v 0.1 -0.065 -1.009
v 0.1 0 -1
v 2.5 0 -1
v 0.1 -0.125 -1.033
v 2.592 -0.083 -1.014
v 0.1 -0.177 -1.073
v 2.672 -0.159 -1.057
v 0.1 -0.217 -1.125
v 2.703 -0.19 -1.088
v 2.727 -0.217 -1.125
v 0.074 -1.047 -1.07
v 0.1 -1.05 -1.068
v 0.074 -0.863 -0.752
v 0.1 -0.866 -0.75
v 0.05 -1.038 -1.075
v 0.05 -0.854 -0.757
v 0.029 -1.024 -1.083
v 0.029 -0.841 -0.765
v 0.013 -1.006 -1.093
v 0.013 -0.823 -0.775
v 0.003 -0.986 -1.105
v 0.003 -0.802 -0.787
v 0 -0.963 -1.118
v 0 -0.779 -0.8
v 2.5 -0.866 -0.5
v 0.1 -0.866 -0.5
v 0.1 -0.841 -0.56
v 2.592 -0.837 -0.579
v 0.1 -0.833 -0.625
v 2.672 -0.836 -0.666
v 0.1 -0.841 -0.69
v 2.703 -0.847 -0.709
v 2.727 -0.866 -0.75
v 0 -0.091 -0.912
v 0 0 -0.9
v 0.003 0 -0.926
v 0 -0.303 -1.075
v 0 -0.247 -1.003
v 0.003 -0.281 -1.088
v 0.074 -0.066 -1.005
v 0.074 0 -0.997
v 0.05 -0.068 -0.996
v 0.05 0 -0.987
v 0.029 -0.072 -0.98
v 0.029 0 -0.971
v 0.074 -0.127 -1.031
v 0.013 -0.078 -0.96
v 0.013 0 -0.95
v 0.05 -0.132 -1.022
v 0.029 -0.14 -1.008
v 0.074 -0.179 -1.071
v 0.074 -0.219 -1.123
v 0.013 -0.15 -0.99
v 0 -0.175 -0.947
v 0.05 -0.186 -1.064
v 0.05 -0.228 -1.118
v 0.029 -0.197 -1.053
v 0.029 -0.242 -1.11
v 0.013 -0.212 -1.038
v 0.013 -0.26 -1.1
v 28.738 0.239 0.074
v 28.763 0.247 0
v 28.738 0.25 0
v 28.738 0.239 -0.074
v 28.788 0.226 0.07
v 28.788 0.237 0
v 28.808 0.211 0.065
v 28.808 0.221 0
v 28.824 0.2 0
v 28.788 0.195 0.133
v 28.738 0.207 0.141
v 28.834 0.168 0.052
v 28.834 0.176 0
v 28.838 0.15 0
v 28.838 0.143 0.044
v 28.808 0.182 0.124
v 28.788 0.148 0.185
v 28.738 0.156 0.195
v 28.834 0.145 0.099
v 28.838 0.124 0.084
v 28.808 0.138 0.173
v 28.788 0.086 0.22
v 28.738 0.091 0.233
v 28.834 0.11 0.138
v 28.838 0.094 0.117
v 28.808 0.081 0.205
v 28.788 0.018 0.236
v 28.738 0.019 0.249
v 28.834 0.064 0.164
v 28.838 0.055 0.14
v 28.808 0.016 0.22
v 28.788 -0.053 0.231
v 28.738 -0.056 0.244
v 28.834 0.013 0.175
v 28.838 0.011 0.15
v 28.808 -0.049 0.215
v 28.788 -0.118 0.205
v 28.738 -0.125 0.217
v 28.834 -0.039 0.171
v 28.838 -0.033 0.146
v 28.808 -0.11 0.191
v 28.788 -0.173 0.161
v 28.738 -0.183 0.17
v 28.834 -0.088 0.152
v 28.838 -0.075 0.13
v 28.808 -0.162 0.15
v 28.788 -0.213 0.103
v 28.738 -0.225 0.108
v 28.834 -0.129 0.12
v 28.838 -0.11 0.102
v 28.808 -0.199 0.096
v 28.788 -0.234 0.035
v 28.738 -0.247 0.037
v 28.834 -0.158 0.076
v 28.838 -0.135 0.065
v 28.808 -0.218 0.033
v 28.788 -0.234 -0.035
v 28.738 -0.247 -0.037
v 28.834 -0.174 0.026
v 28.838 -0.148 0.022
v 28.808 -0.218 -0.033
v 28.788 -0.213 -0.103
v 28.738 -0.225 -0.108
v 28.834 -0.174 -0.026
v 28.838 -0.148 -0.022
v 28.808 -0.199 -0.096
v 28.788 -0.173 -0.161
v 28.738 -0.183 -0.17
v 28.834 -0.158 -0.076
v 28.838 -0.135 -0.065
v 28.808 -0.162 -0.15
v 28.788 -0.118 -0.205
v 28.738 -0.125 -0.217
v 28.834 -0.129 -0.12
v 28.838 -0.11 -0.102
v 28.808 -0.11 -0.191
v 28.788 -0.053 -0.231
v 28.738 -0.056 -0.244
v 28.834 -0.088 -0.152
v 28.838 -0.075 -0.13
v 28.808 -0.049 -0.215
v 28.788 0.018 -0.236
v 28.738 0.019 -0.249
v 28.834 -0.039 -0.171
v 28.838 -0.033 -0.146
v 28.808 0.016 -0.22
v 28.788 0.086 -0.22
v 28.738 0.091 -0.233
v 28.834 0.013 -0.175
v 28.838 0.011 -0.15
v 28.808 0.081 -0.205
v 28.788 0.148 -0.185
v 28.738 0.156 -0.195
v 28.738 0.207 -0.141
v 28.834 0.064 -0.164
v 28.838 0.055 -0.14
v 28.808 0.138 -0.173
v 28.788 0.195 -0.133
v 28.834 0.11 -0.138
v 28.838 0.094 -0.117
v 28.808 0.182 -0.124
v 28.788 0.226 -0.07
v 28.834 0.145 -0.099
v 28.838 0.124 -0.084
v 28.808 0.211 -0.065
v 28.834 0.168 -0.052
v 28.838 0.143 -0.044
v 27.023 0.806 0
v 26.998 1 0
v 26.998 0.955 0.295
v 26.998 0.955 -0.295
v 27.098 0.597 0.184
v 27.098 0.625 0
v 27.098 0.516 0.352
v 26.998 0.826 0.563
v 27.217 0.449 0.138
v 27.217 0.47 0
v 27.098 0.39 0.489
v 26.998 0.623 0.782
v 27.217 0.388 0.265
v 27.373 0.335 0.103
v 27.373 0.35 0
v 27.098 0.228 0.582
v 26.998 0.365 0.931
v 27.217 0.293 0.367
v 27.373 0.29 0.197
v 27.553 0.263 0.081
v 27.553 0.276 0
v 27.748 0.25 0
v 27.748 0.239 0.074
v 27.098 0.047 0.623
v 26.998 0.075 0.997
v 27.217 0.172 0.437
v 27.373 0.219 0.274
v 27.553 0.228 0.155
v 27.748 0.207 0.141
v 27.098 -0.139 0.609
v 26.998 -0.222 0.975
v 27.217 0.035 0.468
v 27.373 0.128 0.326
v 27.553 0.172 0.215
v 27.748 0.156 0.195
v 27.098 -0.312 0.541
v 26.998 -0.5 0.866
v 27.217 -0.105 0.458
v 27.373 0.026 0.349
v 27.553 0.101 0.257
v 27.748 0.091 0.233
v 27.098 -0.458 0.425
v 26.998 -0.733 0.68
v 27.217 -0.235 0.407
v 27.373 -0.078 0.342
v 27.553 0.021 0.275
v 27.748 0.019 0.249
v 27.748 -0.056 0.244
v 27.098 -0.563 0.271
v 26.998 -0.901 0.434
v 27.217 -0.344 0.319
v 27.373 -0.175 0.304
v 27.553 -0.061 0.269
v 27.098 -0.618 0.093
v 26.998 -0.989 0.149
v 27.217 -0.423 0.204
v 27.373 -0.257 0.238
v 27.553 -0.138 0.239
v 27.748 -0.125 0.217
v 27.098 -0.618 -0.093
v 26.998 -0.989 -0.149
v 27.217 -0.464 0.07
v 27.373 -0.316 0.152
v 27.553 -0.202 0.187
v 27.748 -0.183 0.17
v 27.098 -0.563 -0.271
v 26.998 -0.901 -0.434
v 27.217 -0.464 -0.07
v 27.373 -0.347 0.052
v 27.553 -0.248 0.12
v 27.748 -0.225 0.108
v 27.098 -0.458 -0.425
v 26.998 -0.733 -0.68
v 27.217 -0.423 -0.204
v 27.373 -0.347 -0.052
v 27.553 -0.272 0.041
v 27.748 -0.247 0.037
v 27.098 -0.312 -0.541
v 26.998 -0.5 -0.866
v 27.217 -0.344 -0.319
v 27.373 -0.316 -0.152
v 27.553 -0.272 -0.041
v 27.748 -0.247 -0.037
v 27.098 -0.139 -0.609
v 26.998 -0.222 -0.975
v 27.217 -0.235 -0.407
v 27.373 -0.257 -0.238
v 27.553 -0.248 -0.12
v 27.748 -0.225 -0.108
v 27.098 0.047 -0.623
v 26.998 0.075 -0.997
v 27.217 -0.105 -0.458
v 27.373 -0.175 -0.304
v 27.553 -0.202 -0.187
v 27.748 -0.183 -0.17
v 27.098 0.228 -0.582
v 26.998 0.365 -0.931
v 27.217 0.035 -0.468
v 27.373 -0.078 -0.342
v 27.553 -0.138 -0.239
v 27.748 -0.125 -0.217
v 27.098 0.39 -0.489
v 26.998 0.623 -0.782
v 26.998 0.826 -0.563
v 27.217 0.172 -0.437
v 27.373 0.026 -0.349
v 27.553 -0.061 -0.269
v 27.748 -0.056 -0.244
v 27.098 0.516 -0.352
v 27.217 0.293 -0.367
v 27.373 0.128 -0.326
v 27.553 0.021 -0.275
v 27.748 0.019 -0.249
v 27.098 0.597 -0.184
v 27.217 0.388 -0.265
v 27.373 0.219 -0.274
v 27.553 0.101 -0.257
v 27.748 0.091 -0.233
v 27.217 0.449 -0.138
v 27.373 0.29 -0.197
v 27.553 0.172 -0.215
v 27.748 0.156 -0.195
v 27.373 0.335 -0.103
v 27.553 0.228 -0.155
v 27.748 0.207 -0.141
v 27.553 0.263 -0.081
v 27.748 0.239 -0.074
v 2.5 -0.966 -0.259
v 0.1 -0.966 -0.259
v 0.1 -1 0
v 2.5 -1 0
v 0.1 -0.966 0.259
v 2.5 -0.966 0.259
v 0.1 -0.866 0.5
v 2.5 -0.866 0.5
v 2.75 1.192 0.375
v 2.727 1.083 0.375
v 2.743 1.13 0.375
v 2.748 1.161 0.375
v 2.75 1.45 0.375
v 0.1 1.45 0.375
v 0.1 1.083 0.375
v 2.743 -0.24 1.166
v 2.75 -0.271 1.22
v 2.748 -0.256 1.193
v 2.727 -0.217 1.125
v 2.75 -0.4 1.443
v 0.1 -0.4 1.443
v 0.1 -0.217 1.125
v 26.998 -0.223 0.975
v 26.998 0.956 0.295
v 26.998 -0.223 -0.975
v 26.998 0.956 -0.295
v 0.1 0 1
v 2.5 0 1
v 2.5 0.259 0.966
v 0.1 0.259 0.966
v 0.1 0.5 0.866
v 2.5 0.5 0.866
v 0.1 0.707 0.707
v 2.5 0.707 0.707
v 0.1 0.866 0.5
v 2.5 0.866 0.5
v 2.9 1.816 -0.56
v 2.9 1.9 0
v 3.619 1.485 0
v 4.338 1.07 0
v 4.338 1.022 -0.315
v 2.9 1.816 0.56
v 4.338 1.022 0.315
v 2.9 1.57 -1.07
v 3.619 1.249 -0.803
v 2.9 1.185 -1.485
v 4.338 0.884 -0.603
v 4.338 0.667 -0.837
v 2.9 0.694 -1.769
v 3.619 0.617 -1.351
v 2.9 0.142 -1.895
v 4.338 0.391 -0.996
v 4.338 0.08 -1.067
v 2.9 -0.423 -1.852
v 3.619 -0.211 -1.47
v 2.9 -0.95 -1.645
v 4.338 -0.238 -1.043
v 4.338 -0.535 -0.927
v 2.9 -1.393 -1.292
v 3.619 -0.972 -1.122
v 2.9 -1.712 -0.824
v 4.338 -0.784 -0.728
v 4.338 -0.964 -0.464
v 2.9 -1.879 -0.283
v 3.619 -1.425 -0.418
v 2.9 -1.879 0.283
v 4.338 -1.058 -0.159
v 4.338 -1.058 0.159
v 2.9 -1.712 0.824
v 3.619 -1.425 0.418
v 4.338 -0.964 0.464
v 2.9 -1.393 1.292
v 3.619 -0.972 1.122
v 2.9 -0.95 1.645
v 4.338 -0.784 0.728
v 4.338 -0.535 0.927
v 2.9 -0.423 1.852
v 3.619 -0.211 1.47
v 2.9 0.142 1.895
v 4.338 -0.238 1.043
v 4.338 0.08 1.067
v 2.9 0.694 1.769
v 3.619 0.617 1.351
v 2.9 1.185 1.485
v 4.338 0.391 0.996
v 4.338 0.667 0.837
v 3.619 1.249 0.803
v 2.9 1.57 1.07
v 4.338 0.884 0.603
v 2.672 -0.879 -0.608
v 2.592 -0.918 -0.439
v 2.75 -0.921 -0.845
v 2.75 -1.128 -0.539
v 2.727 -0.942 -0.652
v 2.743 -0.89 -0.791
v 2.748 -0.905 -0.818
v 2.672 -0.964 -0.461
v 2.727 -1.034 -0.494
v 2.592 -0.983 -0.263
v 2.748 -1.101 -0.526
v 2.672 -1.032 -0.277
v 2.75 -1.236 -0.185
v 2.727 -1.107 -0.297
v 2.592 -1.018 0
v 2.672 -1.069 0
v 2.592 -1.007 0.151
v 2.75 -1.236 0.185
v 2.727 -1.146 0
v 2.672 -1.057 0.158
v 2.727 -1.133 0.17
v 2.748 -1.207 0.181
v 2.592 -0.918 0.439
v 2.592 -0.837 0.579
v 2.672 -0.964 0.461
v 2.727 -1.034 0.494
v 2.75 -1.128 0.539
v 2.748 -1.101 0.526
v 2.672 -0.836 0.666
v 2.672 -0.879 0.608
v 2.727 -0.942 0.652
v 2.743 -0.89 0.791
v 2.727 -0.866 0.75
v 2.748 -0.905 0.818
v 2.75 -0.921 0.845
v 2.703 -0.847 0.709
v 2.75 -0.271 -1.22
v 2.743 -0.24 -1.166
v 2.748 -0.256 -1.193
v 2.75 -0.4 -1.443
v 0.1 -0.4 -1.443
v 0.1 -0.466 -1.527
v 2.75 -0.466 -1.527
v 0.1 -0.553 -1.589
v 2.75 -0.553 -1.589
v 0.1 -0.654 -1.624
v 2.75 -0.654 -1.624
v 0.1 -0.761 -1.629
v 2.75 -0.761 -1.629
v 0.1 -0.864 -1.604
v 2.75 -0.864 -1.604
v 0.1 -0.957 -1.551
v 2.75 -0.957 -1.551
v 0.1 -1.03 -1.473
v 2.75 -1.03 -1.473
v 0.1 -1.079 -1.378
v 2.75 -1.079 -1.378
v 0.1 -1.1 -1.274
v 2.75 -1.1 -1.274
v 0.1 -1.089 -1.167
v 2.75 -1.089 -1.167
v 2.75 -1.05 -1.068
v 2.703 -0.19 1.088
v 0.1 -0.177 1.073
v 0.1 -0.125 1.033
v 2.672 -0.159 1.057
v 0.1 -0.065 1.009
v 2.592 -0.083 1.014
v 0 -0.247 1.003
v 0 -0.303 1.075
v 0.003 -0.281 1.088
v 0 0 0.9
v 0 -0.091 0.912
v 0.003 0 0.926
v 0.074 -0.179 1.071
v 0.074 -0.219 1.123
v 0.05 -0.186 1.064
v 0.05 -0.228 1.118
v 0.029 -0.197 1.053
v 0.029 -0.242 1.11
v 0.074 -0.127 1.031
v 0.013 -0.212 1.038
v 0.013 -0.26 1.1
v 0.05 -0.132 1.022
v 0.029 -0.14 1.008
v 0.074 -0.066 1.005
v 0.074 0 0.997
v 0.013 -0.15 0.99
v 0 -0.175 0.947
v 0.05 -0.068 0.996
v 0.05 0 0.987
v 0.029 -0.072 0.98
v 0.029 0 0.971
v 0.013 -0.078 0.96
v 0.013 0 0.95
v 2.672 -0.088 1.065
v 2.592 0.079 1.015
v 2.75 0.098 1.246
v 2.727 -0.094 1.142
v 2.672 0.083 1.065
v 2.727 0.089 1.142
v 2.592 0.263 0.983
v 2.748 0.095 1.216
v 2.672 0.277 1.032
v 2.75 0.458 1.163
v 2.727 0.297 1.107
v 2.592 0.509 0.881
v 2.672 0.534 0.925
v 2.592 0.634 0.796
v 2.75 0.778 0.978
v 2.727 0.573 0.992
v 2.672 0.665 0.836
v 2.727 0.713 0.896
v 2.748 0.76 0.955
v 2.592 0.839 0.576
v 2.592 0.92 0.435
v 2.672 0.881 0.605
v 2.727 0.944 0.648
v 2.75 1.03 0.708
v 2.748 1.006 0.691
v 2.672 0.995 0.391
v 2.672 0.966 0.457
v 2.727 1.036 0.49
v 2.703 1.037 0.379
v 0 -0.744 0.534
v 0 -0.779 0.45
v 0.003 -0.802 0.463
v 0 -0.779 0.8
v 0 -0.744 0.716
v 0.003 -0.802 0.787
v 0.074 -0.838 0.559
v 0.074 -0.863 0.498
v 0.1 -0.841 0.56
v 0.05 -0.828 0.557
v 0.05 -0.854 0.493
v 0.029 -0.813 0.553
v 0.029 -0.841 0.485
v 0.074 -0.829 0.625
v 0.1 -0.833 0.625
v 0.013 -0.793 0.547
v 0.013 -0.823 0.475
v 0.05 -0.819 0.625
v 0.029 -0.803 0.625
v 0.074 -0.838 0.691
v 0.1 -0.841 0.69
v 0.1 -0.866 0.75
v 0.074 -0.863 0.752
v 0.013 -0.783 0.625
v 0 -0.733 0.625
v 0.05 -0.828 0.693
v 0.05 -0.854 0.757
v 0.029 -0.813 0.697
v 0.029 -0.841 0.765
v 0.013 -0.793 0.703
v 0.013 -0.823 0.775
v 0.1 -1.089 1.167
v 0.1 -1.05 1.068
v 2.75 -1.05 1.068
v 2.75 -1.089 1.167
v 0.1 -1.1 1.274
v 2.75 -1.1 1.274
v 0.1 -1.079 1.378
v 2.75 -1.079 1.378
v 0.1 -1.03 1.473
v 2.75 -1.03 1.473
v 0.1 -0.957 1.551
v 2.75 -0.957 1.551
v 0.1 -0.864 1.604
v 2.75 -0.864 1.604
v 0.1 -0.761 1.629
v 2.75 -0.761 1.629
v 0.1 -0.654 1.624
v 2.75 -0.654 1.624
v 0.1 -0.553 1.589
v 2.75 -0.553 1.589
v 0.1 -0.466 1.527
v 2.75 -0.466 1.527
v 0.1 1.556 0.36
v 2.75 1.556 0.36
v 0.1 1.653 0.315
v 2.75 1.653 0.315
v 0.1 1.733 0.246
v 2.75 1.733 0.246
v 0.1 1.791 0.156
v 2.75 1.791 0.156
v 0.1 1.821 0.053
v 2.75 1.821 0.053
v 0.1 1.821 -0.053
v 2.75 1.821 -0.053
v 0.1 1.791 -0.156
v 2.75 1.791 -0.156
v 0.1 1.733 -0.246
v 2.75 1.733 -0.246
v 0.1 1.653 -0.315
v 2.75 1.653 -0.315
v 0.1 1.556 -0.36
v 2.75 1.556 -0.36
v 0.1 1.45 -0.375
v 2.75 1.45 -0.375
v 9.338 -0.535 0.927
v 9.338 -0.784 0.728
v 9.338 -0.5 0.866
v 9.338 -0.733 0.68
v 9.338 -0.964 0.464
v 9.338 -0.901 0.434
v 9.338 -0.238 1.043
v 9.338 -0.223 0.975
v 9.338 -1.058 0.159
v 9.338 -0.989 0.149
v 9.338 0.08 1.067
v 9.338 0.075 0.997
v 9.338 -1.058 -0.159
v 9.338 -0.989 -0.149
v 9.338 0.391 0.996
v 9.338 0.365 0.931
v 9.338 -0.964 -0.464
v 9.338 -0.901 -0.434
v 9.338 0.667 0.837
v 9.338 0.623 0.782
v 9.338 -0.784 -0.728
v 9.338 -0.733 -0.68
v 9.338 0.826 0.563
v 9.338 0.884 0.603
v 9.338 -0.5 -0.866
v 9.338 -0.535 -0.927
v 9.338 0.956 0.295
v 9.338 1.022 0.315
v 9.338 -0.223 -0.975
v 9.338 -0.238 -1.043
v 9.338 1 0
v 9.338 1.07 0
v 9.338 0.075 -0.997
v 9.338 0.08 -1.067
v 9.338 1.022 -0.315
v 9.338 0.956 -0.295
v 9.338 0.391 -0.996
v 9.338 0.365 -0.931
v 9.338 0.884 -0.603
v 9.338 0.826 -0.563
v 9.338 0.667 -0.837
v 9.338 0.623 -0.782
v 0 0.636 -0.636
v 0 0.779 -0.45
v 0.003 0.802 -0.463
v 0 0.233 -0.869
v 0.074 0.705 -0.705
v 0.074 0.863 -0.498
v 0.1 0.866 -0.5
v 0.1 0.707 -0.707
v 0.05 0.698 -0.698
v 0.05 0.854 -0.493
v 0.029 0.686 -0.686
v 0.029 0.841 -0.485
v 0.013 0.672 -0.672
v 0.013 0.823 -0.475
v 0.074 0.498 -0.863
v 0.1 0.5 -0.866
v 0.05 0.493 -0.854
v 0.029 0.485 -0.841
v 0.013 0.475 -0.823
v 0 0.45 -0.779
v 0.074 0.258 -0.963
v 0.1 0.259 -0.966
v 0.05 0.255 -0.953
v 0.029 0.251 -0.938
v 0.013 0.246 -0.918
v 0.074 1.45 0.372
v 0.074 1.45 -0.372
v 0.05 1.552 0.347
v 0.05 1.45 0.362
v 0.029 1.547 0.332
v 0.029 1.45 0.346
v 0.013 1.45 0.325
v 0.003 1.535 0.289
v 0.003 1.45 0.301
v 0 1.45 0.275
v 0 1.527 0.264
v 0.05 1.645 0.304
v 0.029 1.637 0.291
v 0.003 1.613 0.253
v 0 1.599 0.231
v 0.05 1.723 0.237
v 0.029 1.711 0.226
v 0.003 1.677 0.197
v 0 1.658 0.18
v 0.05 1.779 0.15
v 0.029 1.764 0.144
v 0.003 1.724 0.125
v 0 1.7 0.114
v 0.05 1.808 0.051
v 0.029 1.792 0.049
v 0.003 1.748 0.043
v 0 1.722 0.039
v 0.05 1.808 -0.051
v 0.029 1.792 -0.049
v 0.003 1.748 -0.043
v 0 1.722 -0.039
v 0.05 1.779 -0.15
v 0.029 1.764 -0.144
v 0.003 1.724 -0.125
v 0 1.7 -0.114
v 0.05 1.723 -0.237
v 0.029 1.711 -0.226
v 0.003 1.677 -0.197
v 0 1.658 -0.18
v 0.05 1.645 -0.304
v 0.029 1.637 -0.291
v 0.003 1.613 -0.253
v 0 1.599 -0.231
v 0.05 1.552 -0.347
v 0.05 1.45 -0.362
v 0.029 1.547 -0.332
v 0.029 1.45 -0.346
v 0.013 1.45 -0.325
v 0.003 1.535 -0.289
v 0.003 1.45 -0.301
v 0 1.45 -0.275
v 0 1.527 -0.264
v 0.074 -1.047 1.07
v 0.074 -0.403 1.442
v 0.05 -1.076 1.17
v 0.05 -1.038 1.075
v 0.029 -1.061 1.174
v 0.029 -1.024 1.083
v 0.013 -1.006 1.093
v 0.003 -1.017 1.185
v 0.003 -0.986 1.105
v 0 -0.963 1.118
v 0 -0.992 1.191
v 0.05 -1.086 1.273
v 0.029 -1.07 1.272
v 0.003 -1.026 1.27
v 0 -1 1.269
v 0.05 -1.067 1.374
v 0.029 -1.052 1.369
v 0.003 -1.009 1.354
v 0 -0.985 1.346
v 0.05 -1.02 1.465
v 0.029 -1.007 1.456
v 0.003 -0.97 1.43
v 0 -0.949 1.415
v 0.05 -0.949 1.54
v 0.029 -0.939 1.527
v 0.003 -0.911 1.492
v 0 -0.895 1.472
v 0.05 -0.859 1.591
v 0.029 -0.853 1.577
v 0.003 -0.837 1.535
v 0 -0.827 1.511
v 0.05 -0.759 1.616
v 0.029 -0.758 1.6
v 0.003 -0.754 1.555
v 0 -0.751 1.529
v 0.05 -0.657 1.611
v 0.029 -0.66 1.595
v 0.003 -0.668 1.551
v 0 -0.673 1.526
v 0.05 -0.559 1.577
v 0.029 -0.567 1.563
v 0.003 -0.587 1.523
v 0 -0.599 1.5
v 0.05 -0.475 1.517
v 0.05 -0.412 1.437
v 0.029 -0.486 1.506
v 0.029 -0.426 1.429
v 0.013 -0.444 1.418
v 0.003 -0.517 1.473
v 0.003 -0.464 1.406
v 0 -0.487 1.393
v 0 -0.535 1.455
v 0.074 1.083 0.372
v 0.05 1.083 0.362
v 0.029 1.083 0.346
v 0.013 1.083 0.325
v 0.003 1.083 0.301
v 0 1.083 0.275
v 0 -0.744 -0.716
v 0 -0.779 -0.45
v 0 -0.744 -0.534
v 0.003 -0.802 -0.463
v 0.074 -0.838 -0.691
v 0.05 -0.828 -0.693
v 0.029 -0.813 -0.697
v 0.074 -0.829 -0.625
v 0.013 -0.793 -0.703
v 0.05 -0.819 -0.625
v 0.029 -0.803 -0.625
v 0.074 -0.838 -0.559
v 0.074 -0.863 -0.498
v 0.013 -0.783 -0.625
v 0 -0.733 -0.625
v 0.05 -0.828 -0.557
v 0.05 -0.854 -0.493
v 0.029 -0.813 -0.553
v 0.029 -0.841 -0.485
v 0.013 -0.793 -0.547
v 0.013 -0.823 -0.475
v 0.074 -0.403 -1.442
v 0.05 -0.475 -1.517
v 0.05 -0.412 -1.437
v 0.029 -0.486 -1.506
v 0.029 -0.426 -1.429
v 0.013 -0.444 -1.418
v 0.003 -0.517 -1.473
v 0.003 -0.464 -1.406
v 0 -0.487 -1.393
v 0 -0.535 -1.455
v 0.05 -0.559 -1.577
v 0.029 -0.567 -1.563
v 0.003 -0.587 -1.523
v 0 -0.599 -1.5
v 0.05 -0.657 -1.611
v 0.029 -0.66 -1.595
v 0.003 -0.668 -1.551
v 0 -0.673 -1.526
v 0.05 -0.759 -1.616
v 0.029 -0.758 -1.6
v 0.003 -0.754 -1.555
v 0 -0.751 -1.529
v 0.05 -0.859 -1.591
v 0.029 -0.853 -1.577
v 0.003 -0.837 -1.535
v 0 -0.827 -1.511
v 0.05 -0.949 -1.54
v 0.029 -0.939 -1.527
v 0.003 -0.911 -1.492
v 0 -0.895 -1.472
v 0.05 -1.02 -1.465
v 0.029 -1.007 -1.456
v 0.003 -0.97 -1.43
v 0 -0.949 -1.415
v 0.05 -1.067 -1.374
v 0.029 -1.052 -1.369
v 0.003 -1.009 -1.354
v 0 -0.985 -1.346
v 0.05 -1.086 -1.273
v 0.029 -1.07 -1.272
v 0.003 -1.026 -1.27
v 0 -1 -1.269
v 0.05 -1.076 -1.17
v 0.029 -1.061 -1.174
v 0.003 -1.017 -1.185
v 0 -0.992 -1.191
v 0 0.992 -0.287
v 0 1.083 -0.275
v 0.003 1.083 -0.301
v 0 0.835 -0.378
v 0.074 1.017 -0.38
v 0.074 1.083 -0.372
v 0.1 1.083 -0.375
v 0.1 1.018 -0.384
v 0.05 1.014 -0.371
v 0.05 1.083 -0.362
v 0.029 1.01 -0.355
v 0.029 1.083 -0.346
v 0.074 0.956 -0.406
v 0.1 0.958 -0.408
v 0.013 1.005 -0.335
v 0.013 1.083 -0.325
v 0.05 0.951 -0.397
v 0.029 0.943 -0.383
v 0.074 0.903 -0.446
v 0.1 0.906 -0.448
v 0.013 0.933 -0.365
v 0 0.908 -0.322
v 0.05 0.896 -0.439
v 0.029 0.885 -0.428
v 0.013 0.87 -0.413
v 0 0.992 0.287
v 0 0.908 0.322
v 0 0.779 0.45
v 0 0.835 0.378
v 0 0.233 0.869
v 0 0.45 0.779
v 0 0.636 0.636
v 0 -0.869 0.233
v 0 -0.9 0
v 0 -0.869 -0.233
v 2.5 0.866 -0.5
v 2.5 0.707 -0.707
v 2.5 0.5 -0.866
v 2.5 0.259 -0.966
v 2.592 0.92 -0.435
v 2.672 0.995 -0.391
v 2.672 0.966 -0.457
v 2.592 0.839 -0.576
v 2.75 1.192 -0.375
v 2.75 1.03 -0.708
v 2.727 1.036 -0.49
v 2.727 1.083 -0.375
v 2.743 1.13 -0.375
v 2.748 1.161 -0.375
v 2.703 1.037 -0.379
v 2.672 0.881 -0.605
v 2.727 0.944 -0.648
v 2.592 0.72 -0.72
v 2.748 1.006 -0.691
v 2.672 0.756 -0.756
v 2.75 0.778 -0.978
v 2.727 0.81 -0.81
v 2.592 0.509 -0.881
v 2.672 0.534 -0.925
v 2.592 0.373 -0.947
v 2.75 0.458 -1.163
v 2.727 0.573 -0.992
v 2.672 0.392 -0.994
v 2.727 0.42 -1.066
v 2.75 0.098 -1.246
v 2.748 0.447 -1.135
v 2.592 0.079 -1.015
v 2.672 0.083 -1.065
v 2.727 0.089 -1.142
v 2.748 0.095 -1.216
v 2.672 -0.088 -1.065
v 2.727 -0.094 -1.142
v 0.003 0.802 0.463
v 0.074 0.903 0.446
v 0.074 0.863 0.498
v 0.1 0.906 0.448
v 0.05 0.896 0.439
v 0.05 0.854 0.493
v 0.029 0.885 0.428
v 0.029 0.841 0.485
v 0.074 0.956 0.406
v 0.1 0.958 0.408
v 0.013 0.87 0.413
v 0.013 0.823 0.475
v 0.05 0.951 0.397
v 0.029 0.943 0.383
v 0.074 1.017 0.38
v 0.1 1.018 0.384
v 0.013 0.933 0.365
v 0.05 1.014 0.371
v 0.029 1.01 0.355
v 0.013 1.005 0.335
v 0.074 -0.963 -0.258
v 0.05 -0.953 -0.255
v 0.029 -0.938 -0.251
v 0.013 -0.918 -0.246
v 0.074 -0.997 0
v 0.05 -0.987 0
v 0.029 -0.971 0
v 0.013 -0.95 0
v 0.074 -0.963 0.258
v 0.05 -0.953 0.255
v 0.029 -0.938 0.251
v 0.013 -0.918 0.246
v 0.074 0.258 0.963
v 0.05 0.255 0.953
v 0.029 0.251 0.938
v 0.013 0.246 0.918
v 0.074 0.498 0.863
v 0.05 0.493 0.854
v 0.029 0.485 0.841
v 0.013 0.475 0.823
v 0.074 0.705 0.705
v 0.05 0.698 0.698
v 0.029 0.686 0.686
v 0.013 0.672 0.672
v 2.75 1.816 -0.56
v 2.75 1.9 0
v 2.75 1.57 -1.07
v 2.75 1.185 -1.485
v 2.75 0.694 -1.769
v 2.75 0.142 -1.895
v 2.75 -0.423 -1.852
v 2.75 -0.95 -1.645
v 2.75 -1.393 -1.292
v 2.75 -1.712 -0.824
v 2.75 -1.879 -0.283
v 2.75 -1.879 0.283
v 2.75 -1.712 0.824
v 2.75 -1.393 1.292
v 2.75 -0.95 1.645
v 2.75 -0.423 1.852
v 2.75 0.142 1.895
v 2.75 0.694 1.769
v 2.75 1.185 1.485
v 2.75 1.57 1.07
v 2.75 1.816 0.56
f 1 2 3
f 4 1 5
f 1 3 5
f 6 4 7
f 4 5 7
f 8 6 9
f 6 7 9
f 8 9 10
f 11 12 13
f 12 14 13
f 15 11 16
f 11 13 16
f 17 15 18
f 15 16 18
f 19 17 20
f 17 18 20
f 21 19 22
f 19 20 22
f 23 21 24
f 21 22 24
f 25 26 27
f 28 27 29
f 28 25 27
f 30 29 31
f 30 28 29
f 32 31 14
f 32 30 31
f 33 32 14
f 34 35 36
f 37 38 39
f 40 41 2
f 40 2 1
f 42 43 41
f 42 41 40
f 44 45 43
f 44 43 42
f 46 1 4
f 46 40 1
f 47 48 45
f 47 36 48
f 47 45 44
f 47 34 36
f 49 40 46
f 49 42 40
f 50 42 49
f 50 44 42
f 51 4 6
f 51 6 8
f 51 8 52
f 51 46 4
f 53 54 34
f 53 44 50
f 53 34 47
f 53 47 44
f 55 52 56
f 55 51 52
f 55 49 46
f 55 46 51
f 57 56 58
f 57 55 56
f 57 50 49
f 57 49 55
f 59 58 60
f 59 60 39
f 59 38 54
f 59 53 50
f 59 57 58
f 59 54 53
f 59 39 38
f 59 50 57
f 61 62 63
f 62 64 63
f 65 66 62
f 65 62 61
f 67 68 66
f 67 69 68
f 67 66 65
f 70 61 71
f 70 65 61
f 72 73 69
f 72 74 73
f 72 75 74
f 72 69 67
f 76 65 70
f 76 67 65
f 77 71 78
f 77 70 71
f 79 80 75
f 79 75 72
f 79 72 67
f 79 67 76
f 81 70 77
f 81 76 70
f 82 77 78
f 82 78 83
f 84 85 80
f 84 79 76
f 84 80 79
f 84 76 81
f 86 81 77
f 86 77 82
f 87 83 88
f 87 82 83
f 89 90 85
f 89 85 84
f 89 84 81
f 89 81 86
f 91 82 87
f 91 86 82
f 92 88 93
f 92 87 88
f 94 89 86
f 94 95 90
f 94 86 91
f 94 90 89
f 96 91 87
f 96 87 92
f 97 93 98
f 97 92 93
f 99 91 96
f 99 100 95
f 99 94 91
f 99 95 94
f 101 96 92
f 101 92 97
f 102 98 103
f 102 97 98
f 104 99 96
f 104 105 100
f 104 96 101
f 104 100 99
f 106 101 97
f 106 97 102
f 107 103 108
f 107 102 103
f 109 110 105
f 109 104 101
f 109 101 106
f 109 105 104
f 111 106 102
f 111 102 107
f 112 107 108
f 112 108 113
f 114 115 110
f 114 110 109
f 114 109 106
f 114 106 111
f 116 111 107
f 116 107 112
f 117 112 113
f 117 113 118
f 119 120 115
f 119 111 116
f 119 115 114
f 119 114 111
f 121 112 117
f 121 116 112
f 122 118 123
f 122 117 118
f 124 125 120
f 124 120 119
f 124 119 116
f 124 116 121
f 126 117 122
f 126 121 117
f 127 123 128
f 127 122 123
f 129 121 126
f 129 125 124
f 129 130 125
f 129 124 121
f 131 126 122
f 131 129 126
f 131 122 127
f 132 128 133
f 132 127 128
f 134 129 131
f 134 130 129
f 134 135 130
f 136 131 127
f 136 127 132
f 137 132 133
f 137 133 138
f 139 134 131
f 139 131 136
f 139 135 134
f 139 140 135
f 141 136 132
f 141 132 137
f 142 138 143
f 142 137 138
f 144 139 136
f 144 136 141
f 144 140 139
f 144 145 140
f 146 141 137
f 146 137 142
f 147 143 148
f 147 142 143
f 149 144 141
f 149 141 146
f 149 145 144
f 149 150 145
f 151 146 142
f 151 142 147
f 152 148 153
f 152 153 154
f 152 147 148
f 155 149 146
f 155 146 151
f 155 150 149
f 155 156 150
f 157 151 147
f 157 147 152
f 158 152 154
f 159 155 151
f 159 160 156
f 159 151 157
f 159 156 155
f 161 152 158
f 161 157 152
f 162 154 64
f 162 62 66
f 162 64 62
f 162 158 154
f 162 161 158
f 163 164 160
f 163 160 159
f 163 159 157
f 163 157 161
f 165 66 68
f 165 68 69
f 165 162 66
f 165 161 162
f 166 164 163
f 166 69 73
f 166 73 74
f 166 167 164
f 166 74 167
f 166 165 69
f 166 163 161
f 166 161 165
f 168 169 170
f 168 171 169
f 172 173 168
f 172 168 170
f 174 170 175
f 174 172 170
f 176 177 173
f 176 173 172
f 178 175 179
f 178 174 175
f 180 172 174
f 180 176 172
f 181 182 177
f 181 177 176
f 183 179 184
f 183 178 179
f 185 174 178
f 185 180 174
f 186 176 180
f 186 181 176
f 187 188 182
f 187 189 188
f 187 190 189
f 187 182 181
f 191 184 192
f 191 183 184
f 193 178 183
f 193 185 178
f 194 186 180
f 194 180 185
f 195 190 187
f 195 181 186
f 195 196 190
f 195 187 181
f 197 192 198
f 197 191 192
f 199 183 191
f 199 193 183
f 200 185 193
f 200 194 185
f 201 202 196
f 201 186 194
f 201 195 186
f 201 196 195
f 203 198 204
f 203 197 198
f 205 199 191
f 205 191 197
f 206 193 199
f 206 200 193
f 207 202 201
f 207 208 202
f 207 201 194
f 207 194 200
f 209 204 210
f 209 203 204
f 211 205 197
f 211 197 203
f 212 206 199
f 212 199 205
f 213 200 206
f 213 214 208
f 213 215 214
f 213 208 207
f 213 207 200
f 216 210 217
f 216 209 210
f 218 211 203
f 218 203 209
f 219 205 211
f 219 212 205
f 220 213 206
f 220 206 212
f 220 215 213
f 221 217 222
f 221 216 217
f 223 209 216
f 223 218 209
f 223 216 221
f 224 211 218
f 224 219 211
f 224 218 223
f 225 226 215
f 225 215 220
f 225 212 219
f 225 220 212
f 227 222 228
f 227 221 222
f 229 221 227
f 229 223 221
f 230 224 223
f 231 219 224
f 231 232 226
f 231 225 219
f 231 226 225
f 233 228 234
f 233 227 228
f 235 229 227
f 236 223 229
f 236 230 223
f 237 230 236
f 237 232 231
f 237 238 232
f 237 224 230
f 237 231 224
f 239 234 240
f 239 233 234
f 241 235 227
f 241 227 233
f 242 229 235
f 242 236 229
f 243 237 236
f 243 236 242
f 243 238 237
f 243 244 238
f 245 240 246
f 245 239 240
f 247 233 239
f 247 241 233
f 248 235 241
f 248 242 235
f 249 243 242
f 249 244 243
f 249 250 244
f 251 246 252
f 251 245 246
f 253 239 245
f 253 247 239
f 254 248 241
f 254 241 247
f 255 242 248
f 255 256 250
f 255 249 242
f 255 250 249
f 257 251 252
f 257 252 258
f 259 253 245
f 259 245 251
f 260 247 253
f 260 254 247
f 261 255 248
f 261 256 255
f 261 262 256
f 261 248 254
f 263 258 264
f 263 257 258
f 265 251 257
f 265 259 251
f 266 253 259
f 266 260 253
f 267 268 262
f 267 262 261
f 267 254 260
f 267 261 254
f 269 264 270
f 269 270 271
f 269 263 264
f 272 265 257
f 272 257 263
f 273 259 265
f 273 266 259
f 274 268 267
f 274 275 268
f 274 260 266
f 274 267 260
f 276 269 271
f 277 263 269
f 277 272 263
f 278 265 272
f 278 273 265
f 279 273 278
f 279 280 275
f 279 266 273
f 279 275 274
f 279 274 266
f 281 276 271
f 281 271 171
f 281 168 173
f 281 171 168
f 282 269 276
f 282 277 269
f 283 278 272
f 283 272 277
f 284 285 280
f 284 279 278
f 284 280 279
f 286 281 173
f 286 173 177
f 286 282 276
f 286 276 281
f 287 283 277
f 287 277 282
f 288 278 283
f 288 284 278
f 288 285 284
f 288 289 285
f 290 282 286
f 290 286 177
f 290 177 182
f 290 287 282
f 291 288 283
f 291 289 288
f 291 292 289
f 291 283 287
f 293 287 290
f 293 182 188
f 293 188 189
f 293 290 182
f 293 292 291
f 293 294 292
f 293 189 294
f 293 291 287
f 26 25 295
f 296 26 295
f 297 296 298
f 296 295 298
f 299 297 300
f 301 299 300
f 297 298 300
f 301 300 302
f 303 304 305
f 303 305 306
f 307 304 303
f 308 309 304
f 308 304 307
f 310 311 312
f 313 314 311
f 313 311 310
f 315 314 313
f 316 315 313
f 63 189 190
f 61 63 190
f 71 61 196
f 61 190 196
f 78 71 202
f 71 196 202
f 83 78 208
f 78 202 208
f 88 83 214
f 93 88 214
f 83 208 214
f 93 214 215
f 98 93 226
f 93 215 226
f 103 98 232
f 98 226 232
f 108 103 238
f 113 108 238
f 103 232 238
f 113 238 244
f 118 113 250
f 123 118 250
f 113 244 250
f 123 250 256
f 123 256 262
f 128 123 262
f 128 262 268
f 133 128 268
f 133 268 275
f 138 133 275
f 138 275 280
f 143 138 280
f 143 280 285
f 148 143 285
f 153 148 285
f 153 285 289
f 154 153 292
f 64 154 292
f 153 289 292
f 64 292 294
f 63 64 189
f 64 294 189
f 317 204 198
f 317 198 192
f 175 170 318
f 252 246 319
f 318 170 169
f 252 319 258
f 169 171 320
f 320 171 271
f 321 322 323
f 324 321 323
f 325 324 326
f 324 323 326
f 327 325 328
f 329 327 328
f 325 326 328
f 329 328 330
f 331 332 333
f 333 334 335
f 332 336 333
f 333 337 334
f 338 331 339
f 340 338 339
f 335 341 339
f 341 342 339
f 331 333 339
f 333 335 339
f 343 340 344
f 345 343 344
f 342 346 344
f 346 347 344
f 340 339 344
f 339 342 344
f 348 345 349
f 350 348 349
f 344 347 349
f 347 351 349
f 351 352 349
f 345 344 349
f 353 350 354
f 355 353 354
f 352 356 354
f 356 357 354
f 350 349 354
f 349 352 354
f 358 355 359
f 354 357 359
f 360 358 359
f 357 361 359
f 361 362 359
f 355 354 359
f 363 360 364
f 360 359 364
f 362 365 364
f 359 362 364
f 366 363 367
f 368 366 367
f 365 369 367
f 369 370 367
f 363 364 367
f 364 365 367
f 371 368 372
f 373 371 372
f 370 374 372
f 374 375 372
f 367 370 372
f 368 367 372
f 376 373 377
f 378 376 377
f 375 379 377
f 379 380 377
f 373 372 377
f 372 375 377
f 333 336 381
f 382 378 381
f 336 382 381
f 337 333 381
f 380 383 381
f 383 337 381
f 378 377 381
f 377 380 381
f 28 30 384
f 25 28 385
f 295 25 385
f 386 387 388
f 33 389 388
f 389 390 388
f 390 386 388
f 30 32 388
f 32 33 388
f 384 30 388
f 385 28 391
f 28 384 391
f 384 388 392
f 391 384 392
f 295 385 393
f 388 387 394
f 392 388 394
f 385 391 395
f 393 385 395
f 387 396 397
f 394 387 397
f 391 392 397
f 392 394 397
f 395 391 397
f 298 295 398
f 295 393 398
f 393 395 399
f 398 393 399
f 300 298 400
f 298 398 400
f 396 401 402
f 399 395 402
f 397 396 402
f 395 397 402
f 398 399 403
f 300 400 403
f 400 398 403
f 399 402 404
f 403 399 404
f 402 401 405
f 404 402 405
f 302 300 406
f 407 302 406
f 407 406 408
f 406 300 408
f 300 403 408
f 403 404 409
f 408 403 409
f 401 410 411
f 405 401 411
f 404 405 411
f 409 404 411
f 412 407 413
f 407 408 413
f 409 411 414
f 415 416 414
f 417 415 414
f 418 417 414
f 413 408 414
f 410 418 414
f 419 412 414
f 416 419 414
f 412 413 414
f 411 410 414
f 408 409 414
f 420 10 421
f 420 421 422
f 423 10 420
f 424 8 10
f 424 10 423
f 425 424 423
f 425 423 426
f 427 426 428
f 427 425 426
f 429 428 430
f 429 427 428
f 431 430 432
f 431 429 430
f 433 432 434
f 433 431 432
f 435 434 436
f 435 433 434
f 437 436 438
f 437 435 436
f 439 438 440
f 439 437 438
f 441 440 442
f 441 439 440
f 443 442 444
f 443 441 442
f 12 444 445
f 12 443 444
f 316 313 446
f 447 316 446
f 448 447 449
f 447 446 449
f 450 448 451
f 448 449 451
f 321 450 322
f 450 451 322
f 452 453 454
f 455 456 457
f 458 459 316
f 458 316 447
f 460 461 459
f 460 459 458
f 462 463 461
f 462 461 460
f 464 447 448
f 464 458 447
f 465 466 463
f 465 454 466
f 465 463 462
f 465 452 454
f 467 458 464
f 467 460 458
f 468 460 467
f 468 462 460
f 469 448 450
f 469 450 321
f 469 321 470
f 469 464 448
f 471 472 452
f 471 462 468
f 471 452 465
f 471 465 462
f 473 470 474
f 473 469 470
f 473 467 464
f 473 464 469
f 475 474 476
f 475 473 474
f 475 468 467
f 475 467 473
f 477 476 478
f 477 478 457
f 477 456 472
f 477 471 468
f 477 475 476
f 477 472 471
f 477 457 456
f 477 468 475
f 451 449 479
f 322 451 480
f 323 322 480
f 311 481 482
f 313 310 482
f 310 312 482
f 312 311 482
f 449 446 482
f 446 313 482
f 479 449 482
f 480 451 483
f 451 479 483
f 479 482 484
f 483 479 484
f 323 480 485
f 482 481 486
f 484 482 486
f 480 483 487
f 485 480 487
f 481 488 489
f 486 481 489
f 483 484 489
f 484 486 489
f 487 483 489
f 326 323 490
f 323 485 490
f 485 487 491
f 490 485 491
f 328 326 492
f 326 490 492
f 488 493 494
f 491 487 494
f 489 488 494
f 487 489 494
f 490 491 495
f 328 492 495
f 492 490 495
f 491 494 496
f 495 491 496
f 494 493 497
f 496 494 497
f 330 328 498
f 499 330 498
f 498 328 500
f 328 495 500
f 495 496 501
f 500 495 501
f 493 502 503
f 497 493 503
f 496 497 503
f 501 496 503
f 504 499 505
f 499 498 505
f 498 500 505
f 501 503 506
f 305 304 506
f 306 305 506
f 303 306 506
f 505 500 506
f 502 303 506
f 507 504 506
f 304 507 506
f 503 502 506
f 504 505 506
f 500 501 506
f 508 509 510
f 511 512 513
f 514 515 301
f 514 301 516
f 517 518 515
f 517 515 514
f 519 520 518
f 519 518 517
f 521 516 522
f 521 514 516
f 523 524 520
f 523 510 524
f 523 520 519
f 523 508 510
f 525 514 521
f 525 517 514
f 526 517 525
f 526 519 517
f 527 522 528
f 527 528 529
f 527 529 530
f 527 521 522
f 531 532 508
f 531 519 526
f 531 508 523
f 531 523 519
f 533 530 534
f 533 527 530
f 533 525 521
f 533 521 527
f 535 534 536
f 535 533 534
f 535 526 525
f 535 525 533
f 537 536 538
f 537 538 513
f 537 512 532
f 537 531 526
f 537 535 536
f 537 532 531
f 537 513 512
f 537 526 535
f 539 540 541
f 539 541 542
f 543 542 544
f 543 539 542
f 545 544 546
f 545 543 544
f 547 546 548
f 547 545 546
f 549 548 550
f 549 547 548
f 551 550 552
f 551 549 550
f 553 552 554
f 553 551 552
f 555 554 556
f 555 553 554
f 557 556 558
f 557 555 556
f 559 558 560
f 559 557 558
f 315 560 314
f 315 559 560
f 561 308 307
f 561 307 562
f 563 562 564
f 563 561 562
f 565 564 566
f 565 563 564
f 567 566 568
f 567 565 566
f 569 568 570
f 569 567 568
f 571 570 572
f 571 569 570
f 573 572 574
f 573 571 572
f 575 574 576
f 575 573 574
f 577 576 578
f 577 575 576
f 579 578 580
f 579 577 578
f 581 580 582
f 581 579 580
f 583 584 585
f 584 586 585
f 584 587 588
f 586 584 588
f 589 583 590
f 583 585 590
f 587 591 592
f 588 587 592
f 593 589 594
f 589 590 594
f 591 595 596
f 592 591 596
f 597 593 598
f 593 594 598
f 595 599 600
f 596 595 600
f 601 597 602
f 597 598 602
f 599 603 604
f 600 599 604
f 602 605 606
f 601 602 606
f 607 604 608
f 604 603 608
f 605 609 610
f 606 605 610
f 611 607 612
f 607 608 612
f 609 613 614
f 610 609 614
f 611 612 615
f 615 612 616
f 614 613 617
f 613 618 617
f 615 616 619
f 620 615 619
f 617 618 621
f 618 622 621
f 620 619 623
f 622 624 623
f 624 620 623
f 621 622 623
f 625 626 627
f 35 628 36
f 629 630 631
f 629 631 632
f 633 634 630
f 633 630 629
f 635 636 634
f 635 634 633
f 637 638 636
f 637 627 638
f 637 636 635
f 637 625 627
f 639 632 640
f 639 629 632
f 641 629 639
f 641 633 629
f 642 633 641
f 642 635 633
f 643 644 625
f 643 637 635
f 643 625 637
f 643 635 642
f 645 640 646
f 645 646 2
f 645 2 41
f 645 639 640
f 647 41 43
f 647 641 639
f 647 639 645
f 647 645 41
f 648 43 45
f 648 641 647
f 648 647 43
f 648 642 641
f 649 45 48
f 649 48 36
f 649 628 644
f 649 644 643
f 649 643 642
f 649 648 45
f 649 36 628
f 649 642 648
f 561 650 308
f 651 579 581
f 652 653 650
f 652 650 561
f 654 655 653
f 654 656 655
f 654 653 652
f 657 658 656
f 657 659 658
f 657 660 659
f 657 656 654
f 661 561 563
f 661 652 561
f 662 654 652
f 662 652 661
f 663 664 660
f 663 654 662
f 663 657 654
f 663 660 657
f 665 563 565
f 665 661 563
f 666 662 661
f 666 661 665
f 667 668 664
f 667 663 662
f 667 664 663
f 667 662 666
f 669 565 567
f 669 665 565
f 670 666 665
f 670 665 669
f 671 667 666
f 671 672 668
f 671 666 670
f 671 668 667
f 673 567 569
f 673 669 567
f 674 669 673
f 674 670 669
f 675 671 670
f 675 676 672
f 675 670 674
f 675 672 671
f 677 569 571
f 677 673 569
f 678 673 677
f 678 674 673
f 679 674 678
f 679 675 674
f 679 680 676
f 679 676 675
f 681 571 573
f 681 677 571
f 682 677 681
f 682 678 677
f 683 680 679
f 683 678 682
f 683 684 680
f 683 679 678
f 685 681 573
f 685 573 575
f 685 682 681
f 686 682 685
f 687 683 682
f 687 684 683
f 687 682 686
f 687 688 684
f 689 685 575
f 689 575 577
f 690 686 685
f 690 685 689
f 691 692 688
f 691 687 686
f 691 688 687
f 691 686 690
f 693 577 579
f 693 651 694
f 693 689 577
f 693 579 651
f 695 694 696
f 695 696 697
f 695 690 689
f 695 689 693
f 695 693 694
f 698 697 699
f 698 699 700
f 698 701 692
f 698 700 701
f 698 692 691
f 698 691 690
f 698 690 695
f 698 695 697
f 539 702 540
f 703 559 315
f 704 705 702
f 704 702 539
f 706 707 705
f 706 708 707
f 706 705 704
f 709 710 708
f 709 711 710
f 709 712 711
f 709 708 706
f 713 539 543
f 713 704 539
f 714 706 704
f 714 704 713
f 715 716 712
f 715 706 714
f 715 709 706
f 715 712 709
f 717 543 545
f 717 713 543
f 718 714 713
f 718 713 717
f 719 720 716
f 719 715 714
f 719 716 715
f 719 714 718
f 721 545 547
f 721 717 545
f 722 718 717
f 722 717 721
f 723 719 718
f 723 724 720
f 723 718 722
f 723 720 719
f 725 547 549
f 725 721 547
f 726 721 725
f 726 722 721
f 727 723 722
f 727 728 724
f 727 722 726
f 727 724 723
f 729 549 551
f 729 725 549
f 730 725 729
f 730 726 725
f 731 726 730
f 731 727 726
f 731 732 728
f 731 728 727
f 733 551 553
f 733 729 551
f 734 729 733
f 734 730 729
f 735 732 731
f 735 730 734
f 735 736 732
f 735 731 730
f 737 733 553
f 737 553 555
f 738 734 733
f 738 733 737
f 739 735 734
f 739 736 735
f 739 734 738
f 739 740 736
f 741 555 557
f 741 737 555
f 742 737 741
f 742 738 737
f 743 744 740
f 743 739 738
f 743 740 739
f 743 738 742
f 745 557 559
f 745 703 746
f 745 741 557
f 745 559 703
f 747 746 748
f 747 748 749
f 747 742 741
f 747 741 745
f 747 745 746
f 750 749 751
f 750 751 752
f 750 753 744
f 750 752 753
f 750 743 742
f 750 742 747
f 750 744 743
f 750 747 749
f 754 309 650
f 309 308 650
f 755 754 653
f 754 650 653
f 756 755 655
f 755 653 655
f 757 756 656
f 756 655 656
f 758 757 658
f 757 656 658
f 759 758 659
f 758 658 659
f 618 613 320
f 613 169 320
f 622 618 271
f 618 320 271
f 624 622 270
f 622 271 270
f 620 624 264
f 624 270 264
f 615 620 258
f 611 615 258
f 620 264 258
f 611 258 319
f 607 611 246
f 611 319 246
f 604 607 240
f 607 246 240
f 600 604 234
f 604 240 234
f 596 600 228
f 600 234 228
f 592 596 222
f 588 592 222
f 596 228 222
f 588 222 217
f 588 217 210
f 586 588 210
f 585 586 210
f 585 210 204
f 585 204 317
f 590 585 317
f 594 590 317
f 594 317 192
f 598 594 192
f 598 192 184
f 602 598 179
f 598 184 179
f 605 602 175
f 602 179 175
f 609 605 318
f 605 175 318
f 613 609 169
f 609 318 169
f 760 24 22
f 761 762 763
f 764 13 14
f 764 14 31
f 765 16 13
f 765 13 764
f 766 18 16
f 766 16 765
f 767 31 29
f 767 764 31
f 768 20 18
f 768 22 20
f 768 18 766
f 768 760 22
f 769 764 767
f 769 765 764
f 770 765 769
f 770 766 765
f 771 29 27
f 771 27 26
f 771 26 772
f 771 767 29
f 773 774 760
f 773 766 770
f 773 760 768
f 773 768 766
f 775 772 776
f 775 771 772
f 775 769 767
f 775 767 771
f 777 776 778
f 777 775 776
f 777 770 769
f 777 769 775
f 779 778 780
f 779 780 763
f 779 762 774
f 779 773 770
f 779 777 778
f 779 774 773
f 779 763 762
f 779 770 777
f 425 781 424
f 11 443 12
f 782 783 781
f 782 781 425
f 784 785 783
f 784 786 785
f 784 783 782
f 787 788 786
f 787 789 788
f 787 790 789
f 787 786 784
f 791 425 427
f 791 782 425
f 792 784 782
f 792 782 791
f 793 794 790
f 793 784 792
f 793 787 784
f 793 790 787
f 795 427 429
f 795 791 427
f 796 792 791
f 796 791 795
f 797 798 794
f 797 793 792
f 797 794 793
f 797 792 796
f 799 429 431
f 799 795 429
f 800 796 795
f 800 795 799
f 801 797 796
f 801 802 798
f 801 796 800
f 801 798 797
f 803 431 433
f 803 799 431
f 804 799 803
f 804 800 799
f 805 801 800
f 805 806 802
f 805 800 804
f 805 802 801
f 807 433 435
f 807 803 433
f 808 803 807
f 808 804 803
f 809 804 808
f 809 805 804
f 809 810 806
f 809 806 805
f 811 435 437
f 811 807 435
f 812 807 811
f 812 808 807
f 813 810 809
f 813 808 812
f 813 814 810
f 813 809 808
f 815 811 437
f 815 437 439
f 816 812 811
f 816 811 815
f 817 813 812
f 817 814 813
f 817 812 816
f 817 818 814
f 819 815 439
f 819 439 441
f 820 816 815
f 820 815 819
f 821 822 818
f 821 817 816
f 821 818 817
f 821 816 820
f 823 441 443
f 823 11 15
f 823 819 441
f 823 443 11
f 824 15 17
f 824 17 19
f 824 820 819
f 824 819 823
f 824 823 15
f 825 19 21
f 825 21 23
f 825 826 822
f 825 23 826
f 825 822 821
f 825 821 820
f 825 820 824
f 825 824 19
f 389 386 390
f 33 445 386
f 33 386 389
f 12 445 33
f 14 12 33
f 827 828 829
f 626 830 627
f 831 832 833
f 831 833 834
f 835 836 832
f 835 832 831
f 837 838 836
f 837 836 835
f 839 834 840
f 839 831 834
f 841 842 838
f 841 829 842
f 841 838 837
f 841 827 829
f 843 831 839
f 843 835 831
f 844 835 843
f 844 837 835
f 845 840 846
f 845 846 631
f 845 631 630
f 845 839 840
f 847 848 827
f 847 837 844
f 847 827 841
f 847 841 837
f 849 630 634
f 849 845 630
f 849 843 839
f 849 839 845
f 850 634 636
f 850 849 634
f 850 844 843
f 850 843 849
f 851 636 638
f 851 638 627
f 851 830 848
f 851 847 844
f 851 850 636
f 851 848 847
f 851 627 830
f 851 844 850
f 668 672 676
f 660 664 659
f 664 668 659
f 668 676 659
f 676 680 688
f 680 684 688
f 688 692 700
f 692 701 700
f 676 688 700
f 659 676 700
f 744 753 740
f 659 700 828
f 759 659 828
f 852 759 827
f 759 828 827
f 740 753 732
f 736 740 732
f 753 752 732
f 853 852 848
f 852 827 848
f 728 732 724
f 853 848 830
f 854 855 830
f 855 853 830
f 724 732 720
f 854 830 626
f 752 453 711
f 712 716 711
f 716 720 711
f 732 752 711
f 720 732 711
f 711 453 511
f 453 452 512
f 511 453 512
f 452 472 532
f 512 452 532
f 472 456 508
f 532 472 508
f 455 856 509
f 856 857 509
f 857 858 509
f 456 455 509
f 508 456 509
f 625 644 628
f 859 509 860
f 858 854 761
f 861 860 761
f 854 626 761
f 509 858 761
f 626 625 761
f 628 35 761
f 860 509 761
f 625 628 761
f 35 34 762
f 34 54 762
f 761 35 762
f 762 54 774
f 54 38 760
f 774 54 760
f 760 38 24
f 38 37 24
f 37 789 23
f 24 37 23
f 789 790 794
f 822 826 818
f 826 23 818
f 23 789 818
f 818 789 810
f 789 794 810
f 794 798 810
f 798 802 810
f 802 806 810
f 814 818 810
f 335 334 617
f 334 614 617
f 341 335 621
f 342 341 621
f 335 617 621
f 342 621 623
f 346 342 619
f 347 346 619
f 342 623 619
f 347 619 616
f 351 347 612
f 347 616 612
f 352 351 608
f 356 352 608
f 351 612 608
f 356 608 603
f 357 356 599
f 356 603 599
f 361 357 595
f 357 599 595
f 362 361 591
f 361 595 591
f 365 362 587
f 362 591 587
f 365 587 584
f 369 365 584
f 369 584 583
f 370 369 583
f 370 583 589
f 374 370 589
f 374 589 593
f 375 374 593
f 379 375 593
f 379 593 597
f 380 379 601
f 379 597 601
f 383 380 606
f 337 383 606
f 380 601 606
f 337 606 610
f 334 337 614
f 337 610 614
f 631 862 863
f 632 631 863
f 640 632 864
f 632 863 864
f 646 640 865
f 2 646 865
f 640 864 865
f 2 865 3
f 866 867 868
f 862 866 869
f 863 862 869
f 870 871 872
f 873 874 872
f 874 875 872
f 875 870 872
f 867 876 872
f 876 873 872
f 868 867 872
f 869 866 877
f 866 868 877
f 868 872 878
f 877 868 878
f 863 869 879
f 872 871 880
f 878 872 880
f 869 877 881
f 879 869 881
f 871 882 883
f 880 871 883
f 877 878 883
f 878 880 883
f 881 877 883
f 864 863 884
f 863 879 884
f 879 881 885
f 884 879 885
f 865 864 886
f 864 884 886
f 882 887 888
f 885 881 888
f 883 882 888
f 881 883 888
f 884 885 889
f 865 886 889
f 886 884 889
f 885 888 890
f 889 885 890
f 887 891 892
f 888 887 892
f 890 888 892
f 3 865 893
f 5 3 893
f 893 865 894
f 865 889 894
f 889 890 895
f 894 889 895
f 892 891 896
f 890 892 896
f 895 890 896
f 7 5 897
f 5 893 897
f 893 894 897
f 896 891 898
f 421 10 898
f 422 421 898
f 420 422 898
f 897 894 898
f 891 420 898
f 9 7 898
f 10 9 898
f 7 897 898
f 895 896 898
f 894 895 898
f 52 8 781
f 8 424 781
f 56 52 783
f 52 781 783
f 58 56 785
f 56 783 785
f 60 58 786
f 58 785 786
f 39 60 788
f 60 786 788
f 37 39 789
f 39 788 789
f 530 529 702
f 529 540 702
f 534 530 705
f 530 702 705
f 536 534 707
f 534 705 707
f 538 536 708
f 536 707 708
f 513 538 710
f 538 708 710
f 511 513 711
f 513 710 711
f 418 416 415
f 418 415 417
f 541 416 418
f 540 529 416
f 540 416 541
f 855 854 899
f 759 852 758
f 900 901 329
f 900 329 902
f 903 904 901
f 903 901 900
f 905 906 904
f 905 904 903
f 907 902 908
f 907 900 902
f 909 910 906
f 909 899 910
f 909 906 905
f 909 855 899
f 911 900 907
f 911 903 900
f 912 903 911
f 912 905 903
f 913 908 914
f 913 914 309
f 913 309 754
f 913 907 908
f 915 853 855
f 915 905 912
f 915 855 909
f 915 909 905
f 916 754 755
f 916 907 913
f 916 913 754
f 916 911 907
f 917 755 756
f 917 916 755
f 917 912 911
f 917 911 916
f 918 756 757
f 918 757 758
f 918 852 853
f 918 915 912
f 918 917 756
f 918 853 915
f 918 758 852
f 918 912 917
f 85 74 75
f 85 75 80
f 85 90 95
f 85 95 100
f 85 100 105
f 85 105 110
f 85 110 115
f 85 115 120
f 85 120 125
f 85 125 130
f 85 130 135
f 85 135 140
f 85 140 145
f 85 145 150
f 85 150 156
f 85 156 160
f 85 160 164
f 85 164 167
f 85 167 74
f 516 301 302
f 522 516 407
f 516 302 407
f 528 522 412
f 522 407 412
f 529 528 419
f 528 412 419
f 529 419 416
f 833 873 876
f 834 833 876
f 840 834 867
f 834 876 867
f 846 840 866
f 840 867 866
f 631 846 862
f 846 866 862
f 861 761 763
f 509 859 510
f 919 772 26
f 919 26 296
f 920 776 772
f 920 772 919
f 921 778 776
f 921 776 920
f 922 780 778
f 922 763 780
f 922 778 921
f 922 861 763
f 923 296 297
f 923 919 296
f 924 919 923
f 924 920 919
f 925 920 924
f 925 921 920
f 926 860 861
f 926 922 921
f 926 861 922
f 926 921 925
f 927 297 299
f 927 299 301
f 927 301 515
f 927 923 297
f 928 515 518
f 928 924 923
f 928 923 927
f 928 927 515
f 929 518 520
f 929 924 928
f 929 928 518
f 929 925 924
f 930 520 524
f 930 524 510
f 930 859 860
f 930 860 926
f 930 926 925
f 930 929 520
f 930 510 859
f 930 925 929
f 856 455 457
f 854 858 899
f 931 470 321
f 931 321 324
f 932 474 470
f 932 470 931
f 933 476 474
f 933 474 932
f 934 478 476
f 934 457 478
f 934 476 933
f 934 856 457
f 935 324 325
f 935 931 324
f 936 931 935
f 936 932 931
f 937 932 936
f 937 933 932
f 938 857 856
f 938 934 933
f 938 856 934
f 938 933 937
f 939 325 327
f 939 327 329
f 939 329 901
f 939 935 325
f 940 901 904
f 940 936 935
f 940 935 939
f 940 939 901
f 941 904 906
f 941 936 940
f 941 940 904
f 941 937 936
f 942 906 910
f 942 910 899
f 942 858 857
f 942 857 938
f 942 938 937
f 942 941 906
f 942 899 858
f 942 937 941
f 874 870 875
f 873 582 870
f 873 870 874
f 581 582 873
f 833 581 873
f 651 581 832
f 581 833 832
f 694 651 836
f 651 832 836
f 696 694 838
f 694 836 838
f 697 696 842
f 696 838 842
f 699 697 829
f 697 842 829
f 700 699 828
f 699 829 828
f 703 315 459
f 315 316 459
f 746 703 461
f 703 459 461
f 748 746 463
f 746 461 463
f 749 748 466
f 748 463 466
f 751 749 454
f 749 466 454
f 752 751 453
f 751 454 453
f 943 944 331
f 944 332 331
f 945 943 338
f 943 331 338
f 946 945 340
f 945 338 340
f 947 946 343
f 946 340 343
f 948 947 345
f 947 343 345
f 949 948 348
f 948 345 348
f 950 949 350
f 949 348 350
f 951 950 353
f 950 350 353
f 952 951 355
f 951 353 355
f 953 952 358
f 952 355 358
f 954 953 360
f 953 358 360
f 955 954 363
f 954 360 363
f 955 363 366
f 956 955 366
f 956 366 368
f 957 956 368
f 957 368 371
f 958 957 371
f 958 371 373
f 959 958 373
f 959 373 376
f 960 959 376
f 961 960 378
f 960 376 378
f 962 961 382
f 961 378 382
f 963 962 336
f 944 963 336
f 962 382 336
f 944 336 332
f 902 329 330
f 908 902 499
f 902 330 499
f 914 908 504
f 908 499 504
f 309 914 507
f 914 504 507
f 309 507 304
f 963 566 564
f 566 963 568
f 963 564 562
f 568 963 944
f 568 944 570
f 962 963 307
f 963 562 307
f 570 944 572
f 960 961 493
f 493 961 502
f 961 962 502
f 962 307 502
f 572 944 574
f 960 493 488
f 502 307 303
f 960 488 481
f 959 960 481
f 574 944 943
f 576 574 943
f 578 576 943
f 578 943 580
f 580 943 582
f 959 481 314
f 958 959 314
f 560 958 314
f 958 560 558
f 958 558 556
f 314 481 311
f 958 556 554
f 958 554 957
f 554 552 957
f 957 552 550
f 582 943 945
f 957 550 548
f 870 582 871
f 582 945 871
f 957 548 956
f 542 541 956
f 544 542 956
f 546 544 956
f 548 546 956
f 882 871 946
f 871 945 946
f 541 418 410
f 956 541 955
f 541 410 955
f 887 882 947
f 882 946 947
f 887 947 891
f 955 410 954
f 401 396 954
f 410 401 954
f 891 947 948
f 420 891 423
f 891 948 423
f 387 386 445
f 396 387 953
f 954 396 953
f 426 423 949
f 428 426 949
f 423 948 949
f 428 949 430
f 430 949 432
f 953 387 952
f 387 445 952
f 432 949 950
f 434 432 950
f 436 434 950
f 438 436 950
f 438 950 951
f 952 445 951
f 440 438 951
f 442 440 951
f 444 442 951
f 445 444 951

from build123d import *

# Parameters (mm, degrees)
Y_KSEKLIK_EKSTR_ZYON1_DEPTH = 2.75
DAIRESEL_KAPLAMA1_COUNT     = 3
RADYUS1_R                   = 0.25
IZIM3_R                     = 0.25
Y_KSEKLIK_EKSTR_ZYON2_DEPTH = 1.84
RADYUS2_R                   = 0.75
RADYUS3_R                   = 0.1


with BuildPart() as part:
    # Çizim1 → Döndür1 (revolve)
    with BuildSketch(Plane.XY):
        Polygon((0, 0), (0, 1), (2.75, 1), (2.75, 1.9), (2.9, 1.9), (4.33760217, 1.07), (9.33760217, 1.07), (9.33760217, 1), (26.99760217, 1), (26.99760217, 0), align=None)
    revolve(axis=Axis((26.99760217, 0, 0), (-1, 0, 0)))

    # Çizim2 → Yükseklik-Ekstrüzyon1 (add)
    with BuildSketch(Plane.ZY):
        with BuildLine():
            Line((-0.375, 0), (0.375, 0))
            Line((0.375, 0), (0.375, 1.45))
            ThreePointArc((0.375, 1.45), (0, 1.825), (-0.375, 1.45))
            Line((-0.375, 1.45), (-0.375, 0))
        make_face()
    y_kseklik_ekstr_zyon1 = extrude(amount=-Y_KSEKLIK_EKSTR_ZYON1_DEPTH)

    # Dairesel Kaplama1: Yükseklik-Ekstrüzyon1 ×3 about axis
    dairesel_kaplama1_axis = Axis((0, 0, 0), (1, 0, 0))
    for i in range(1, DAIRESEL_KAPLAMA1_COUNT):
        add(y_kseklik_ekstr_zyon1.rotate(dairesel_kaplama1_axis, i * 360 / DAIRESEL_KAPLAMA1_COUNT))

    # Radyus1
    radyus1_edges = [part.edges().sort_by_distance(p)[0] for p in [
        (2.75, 0.5, 0.866025404),
        (1.375, 0.927024811, -0.375),
        (1.375, 0.927024811, 0.375),
        (2.75, -1, 0),
        (2.75, 0.5, -0.866025404),
        (1.375, -0.138752879, 0.990327036),
        (1.375, -0.788271932, 0.615327036),
        (1.375, -0.788271932, -0.615327036),
        (1.375, -0.138752879, -0.990327036),
    ]]
    fillet(radyus1_edges, radius=RADYUS1_R)

    # Çizim3 → Yükseklik-Ekstrüzyon2 (add)
    with BuildSketch(Plane(origin=(26.99760217, 0, 0), x_dir=(0, 0, -1), z_dir=(1, 0, 0))):
        with Locations(Location((0, 0, 0), (0, 0, 90))):
            Circle(IZIM3_R)
    extrude(amount=Y_KSEKLIK_EKSTR_ZYON2_DEPTH)

    # Radyus2
    radyus2_edges = [part.edges().sort_by_distance(p)[0] for p in [
        (26.99760217, -0.25, 0),
    ]]
    fillet(radyus2_edges, radius=RADYUS2_R - 0.0001)  # a hair under: the kernel refuses the full size

    # Radyus3
    radyus3_edges = [part.edges().sort_by_distance(p)[0] for p in [
        (28.83760217, -0.25, 0),
        (0, 1.825, 0),
        (0, 1.266265877, -0.375),
        (0, -0.9125, -1.580496362),
        (0, -0.957892465, -0.909118418),
        (0, -0.9125, 1.580496362),
        (0, -0.308373412, 1.284118418),
        (0, 0.4999999999999995, -0.8660254037844389),
        (0, -0.308373412, -1.284118418),
        (0, -1, 0),
        (0, -0.957892465, 0.909118418),
        (0, 0.49999999999999933, 0.866025403784439),
        (0, 1.266265877, 0.375),
        (0, 0.957531755, -0.408493649),
        (0, -0.125, -1.033493649),
        (0, -0.832531755, -0.625),
        (0, -0.832531755, 0.625),
        (0, -0.125, 1.033493649),
        (0, 0.957531755, 0.408493649),
    ]]
    fillet(radyus3_edges, radius=RADYUS3_R)


solid = part.part
